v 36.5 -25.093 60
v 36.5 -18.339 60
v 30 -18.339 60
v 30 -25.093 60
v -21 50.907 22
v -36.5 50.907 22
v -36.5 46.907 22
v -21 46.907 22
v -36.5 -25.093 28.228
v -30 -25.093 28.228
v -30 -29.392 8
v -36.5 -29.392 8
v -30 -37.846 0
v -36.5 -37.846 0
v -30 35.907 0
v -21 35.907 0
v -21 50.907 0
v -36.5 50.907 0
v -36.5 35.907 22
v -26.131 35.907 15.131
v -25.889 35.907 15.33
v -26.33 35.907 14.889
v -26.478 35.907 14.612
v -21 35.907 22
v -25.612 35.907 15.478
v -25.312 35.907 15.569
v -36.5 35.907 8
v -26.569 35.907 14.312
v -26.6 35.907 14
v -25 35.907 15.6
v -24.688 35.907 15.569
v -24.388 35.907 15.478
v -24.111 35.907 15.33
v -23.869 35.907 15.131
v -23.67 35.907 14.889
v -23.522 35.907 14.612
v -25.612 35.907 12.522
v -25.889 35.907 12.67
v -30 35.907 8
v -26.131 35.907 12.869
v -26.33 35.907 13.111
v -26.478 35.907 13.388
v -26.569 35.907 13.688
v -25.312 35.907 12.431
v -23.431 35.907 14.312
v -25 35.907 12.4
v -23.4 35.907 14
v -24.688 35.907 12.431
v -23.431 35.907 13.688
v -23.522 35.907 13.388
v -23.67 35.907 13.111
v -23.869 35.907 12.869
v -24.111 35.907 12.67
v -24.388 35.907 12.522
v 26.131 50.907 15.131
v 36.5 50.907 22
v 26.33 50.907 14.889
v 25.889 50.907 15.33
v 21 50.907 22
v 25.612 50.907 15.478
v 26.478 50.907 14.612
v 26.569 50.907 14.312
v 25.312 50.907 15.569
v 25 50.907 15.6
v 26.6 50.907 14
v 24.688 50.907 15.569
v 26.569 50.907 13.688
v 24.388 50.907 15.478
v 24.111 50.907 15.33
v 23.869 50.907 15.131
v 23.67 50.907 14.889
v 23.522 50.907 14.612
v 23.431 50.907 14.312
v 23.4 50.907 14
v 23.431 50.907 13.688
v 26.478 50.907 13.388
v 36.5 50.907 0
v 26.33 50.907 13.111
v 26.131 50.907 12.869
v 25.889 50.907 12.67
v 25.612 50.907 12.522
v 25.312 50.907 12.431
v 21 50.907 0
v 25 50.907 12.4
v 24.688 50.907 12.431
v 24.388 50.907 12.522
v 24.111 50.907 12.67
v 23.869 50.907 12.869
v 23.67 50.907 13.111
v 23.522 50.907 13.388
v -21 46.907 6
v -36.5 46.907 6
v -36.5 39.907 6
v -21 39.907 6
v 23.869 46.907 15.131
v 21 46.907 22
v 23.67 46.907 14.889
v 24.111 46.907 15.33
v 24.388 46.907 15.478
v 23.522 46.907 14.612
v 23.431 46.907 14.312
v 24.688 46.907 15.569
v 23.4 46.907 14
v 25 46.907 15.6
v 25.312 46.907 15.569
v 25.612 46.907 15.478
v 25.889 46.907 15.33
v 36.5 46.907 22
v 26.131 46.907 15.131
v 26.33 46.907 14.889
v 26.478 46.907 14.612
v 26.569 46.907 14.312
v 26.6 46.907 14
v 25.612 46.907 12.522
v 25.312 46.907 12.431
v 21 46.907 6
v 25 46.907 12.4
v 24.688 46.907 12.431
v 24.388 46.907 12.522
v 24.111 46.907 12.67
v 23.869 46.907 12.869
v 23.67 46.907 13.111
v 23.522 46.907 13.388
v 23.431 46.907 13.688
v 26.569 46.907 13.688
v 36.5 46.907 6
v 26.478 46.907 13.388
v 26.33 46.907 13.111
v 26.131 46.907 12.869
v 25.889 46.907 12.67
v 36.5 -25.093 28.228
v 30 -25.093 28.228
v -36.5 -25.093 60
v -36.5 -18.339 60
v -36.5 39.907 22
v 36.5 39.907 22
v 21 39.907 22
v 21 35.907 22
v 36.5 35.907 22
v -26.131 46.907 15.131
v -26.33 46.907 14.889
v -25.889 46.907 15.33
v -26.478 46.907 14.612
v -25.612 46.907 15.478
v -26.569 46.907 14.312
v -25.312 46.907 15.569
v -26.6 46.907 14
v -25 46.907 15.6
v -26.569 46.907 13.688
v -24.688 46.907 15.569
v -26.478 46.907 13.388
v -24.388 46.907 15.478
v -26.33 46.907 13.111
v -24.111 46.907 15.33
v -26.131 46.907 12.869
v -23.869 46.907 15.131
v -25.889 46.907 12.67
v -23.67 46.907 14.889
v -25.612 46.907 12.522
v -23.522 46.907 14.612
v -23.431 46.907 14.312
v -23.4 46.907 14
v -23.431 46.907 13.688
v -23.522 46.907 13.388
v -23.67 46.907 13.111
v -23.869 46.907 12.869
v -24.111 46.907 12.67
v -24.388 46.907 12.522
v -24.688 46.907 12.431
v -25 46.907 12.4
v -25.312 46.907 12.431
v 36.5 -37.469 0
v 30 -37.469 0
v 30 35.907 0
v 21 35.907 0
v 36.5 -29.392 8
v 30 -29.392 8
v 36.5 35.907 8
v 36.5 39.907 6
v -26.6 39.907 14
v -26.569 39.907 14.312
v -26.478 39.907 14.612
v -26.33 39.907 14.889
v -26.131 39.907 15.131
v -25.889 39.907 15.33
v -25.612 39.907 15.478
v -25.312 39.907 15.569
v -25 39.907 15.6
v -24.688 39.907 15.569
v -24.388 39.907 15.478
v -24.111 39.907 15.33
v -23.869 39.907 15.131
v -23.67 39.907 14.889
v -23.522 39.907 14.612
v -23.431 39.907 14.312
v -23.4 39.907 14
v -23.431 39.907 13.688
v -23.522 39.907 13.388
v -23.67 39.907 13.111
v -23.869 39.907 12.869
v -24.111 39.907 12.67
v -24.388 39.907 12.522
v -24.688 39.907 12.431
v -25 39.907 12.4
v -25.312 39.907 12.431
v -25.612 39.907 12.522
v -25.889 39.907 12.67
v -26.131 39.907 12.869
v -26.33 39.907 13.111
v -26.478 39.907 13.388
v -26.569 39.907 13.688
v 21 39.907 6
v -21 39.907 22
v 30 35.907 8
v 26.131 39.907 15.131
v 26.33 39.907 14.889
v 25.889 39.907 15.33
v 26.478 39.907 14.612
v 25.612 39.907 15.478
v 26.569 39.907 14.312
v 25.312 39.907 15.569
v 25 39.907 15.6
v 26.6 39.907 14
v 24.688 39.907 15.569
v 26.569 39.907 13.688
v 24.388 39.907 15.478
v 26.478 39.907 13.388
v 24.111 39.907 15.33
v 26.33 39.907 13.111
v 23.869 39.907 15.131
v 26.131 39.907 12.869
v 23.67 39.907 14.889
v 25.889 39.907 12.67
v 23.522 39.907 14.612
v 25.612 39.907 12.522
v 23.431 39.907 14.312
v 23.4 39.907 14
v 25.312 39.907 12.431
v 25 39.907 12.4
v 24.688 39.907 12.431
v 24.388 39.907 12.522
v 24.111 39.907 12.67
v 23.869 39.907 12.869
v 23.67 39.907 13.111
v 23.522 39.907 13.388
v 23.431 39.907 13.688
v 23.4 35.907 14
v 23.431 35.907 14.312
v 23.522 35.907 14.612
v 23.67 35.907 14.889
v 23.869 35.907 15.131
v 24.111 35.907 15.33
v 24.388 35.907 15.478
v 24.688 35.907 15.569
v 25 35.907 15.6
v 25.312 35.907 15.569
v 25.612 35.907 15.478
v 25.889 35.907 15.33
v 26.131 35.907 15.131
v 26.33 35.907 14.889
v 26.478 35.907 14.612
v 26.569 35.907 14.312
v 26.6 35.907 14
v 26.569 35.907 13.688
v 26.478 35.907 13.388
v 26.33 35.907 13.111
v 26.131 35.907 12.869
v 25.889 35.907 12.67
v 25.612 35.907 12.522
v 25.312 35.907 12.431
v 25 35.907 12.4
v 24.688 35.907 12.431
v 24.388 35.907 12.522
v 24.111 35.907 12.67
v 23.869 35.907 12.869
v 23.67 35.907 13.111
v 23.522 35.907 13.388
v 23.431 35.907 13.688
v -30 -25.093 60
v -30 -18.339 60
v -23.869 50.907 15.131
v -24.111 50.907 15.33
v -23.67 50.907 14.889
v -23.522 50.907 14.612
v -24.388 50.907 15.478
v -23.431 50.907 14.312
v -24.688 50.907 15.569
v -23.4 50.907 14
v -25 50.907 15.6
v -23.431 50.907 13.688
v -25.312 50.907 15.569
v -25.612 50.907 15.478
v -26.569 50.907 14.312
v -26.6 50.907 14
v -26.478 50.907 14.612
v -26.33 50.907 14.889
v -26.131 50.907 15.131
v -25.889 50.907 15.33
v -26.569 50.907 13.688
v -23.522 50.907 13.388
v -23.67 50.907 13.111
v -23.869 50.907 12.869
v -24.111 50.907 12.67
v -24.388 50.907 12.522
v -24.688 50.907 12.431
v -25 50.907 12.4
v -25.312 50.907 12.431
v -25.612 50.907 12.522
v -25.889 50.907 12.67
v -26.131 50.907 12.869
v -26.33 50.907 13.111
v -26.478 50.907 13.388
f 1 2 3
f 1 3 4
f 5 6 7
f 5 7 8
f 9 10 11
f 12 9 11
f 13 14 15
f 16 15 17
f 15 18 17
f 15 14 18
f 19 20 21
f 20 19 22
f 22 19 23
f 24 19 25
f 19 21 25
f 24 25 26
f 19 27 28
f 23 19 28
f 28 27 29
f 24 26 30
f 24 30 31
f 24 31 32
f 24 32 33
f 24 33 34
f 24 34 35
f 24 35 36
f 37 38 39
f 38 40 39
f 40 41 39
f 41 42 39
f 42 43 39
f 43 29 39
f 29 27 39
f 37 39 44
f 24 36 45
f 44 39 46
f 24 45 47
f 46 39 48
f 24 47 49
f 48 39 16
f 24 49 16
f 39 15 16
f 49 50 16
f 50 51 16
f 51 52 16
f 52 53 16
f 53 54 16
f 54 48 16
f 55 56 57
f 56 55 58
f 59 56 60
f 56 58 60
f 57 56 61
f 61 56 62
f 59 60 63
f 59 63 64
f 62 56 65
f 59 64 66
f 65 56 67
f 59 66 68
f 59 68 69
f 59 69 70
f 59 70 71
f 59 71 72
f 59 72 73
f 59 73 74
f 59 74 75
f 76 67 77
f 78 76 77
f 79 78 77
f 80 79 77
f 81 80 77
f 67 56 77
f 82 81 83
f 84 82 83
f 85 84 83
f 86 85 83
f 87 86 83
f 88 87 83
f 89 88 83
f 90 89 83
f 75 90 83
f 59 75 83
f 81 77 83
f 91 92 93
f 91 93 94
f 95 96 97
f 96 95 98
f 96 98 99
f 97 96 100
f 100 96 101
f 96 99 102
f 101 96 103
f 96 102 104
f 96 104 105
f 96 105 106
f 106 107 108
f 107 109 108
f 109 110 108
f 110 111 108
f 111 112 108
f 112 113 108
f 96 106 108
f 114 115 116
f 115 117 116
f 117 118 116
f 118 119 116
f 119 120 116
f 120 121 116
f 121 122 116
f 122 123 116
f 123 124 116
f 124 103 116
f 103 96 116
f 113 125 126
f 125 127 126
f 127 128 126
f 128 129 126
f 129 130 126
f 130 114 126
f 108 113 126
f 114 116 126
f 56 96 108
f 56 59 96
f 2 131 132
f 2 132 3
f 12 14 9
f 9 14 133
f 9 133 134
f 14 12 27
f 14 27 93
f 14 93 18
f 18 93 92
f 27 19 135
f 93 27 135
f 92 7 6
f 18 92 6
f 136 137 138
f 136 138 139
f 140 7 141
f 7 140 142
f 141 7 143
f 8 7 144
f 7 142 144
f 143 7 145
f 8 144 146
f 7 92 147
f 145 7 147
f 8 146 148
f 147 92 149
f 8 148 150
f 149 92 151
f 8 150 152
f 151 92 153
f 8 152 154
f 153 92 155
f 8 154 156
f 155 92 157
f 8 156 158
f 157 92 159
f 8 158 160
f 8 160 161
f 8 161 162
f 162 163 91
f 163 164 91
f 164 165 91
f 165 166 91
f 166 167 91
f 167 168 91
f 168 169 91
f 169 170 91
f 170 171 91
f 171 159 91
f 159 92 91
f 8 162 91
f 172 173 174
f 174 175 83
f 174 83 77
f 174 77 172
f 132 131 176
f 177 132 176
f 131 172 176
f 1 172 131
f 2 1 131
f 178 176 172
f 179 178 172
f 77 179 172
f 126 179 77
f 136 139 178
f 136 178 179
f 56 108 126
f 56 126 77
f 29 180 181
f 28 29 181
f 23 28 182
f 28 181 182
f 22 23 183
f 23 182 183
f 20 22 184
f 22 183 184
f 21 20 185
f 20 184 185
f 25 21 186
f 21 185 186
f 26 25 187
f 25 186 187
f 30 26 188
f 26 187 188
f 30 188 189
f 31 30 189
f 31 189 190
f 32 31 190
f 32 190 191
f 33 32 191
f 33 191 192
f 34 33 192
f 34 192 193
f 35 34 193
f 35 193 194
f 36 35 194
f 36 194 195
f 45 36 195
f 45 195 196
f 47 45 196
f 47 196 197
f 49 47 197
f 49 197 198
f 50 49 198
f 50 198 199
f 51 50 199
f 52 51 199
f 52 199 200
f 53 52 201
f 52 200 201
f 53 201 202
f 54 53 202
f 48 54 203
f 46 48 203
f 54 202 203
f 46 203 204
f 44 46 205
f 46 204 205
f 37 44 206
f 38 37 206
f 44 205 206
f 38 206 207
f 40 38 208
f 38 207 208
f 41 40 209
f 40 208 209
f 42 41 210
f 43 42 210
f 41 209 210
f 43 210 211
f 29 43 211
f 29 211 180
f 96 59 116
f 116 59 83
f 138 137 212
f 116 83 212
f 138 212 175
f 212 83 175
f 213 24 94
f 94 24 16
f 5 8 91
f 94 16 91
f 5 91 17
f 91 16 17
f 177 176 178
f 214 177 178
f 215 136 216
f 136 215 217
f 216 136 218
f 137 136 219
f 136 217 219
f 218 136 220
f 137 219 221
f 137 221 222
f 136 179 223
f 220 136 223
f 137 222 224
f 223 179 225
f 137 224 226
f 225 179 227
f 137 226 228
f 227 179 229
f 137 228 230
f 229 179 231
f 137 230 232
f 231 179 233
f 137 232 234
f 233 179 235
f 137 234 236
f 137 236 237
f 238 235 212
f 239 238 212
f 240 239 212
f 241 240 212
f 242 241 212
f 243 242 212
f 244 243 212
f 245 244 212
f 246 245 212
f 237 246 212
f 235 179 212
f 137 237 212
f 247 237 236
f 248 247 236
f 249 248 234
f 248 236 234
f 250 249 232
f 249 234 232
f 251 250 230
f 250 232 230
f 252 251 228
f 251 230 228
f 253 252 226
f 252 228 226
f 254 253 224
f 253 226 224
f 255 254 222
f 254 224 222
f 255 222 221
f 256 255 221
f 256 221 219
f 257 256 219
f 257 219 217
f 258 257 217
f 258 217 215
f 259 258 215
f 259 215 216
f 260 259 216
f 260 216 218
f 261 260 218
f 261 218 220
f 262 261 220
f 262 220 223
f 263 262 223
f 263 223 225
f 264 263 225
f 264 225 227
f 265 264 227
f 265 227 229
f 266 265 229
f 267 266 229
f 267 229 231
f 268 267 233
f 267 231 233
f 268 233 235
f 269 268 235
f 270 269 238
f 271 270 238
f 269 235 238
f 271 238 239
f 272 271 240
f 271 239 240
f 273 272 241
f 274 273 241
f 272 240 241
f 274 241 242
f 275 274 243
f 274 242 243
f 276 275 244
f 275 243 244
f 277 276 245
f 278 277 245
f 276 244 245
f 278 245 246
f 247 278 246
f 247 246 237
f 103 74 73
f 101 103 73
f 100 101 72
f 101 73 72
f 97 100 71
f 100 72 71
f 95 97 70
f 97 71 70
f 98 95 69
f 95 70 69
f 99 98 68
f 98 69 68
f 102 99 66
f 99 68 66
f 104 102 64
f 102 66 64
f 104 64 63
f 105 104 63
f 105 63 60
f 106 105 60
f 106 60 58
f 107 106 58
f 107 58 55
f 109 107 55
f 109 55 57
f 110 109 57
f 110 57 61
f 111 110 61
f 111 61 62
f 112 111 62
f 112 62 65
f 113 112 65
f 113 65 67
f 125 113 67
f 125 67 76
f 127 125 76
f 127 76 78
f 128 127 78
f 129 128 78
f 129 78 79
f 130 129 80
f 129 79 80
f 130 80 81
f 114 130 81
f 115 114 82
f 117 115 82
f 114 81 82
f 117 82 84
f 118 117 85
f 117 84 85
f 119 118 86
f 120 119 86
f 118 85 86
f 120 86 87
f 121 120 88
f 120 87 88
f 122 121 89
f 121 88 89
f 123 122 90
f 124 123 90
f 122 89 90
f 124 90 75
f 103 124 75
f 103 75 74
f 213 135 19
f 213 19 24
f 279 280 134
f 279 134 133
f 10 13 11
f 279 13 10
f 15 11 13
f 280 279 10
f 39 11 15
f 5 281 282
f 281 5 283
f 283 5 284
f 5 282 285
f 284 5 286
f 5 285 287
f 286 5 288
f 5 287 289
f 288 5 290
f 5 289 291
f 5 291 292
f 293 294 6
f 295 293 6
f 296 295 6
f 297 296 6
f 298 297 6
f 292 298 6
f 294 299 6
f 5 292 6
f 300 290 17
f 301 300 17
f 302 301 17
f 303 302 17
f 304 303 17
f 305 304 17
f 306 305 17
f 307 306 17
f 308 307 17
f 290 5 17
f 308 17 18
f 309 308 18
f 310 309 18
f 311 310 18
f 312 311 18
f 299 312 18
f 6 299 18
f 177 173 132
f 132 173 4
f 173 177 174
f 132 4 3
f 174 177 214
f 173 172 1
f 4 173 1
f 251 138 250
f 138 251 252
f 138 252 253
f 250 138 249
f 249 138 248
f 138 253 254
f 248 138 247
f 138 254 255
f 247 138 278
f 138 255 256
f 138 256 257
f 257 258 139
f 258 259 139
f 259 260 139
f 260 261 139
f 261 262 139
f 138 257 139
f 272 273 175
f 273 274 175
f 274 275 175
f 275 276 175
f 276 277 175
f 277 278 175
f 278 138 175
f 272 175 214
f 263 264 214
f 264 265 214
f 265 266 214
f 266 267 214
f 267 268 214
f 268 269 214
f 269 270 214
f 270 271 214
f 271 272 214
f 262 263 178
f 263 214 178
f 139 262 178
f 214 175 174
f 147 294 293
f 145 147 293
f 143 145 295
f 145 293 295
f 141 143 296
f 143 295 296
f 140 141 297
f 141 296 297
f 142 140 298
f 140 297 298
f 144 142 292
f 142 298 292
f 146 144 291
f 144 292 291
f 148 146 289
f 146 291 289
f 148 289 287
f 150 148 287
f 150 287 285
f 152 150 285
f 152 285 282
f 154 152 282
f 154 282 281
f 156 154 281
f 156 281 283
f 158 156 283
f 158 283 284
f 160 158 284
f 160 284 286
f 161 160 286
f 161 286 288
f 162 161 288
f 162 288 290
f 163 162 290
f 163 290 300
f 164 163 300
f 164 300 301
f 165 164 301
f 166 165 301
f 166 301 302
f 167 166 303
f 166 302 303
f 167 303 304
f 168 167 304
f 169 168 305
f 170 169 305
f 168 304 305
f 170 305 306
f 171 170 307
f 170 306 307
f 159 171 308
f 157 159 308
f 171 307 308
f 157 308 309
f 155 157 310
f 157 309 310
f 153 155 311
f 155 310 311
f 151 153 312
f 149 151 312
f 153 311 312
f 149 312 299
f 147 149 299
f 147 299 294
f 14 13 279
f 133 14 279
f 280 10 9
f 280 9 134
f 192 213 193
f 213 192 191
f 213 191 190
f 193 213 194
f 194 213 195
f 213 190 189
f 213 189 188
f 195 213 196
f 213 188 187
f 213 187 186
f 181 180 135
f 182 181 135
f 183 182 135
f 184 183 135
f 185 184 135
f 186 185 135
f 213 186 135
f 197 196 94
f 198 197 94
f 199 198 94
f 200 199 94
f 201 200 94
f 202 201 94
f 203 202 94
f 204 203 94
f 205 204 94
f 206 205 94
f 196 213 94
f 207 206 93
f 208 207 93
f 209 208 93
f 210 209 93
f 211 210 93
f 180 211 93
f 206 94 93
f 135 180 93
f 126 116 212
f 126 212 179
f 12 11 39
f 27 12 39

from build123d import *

# Parameters (mm, degrees)
F0_W      = 15.5
F0_H      = 7
F1_DEPTH  = 6
F2_DEPTH  = 22
F0_W_2    = 6.5
F0_H_2    = 61
F3_DEPTH  = 8
F0_H_3    = 6
F4_DEPTH  = 60
F5_DEPTH  = 6
F6_DEPTH  = 22
F7_DEPTH  = 8
F8_DEPTH  = 60
F9_R      = 1.6
F10_DEPTH = 82.001
F11_DEPTH = 82.001
F13_DEPTH = 6.5
F14_DEPTH = 6.5
F16_DEPTH = 6.5
F17_DEPTH = 6.5


with BuildPart() as f1:
    # F0 (on Top) → F1 (new body)
    with BuildSketch(Plane.XY):
        with Locations((-28.75, 43.4073674564)):
            Rectangle(F0_W, F0_H)
    extrude(amount=F1_DEPTH)

    # F0 (on Top) → F2 (join)
    with BuildSketch(Plane.XY):
        Polygon((-21, 50.9073674564), (-30, 50.9073674564), (-36.5, 50.9073674564), (-36.5, 46.9073674564), (-21, 46.9073674564), align=None)
        Polygon((-21, 39.9073674564), (-36.5, 39.9073674564), (-36.5, 35.9073674564), (-30, 35.9073674564), (-21, 35.9073674564), align=None)
    extrude(amount=F2_DEPTH)

    # F0 (on Top) → F3 (join)
    with BuildSketch(Plane.XY):
        with Locations((-33.25, 5.4073674564)):
            Rectangle(F0_W_2, F0_H_2)
    extrude(amount=F3_DEPTH)

    # F0 (on Top) → F4 (join)
    with BuildSketch(Plane.XY):
        with Locations((-33.25, -28.0926325436)):
            Rectangle(F0_W_2, F0_H_3)
    extrude(amount=F4_DEPTH)

    # F9 (on face) → F11 (cut, through all)
    with BuildSketch(Plane(origin=(0, 50.9073674564, 0), x_dir=(-1, 0, 0), z_dir=(0, 1, 0))):
        with Locations((25, 14)):
            Circle(F9_R)
    extrude(amount=-F11_DEPTH, mode=Mode.SUBTRACT)

    # F12 (on face) → F13 (join)
    with BuildSketch(Plane.YZ.offset(-30)):
        Polygon((-18.3392388434, 60), (-25.0926325436, 60), (-25.0926325436, 28.2277806569), align=None)
        Polygon((-25.0926325436, 60), (-31.0926325436, 31.7722193431), (-31.0926325436, 0), (-29.3921800502, 8), (-25.0926325436, 28.2277806569), align=None)
        Polygon((-31.0926325436, 0), (-31.0926325436, 31.7722193431), (-37.8460262438, 0), align=None)
        Polygon((-29.3921800502, 8), (-31.0926325436, 0), (-25.0926325436, 0), (-25.0926325436, 8), align=None)
    extrude(amount=-F13_DEPTH)

    # F12 (on face) → F14 (cut)
    with BuildSketch(Plane.YZ.offset(-30)):
        Polygon((-25.0926325436, 60), (-31.0926325436, 60), (-31.0926325436, 31.7722193431), align=None)
        Polygon((-31.0926325436, 31.7722193431), (-31.0926325436, 60), (-43.8460262438, 0), (-37.8460262438, 0), align=None)
        Polygon((-25.0926325436, 8), (-25.0926325436, 28.2277806569), (-29.3921800502, 8), align=None)
    extrude(amount=-F14_DEPTH, mode=Mode.SUBTRACT)


with BuildPart() as f5:
    # F0 (on Top) → F5 (new body)
    with BuildSketch(Plane.XY):
        with Locations((28.75, 43.4073674564)):
            Rectangle(F0_W, F0_H)
    extrude(amount=F5_DEPTH)

    # F0 (on Top) → F6 (join)
    with BuildSketch(Plane.XY):
        Polygon((21, 46.9073674564), (36.5, 46.9073674564), (36.5, 50.9073674564), (30, 50.9073674564), (21, 50.9073674564), align=None)
        Polygon((30, 35.9073674564), (36.5, 35.9073674564), (36.5, 39.9073674564), (21, 39.9073674564), (21, 35.9073674564), align=None)
    extrude(amount=F6_DEPTH)

    # F0 (on Top) → F7 (join)
    with BuildSketch(Plane.XY):
        with Locations((33.25, 5.4073674564)):
            Rectangle(F0_W_2, F0_H_2)
    extrude(amount=F7_DEPTH)

    # F0 (on Top) → F8 (join)
    with BuildSketch(Plane.XY):
        with Locations((33.25, -28.0926325436)):
            Rectangle(F0_W_2, F0_H_3)
    extrude(amount=F8_DEPTH)

    # F9 (on face) → F10 (cut, through all)
    with BuildSketch(Plane(origin=(0, 50.9073674564, 0), x_dir=(-1, 0, 0), z_dir=(0, 1, 0))):
        with Locations((-25, 14)):
            Circle(F9_R)
    extrude(amount=-F10_DEPTH, mode=Mode.SUBTRACT)

    # F15 (on face) → F16 (join)
    with BuildSketch(Plane.YZ.offset(36.5)):
        Polygon((-18.3392388434, 60), (-25.0926325436, 60), (-25.0926325436, 28.2277806569), align=None)
        Polygon((-25.0926325436, 60), (-31.0926325436, 30.9130792844), (-31.0926325436, 0), (-29.3921800502, 8), (-25.0926325436, 28.2277806569), align=None)
        Polygon((-31.0926325436, 0), (-31.0926325436, 30.9130792844), (-37.4693293937, 0), align=None)
    extrude(amount=-F16_DEPTH)

    # F15 (on face) → F17 (cut)
    with BuildSketch(Plane.YZ.offset(36.5)):
        Polygon((-25.0926325436, 60), (-31.0926325436, 60), (-31.0926325436, 30.9130792844), align=None)
        Polygon((-31.0926325436, 30.9130792844), (-31.0926325436, 60), (-43.8460262438, 0), (-37.4693293937, 0), align=None)
        Polygon((-25.0926325436, 8), (-25.0926325436, 28.2277806569), (-29.3921800502, 8), align=None)
    extrude(amount=-F17_DEPTH, mode=Mode.SUBTRACT)


solid = Compound([f1.part, f5.part])
